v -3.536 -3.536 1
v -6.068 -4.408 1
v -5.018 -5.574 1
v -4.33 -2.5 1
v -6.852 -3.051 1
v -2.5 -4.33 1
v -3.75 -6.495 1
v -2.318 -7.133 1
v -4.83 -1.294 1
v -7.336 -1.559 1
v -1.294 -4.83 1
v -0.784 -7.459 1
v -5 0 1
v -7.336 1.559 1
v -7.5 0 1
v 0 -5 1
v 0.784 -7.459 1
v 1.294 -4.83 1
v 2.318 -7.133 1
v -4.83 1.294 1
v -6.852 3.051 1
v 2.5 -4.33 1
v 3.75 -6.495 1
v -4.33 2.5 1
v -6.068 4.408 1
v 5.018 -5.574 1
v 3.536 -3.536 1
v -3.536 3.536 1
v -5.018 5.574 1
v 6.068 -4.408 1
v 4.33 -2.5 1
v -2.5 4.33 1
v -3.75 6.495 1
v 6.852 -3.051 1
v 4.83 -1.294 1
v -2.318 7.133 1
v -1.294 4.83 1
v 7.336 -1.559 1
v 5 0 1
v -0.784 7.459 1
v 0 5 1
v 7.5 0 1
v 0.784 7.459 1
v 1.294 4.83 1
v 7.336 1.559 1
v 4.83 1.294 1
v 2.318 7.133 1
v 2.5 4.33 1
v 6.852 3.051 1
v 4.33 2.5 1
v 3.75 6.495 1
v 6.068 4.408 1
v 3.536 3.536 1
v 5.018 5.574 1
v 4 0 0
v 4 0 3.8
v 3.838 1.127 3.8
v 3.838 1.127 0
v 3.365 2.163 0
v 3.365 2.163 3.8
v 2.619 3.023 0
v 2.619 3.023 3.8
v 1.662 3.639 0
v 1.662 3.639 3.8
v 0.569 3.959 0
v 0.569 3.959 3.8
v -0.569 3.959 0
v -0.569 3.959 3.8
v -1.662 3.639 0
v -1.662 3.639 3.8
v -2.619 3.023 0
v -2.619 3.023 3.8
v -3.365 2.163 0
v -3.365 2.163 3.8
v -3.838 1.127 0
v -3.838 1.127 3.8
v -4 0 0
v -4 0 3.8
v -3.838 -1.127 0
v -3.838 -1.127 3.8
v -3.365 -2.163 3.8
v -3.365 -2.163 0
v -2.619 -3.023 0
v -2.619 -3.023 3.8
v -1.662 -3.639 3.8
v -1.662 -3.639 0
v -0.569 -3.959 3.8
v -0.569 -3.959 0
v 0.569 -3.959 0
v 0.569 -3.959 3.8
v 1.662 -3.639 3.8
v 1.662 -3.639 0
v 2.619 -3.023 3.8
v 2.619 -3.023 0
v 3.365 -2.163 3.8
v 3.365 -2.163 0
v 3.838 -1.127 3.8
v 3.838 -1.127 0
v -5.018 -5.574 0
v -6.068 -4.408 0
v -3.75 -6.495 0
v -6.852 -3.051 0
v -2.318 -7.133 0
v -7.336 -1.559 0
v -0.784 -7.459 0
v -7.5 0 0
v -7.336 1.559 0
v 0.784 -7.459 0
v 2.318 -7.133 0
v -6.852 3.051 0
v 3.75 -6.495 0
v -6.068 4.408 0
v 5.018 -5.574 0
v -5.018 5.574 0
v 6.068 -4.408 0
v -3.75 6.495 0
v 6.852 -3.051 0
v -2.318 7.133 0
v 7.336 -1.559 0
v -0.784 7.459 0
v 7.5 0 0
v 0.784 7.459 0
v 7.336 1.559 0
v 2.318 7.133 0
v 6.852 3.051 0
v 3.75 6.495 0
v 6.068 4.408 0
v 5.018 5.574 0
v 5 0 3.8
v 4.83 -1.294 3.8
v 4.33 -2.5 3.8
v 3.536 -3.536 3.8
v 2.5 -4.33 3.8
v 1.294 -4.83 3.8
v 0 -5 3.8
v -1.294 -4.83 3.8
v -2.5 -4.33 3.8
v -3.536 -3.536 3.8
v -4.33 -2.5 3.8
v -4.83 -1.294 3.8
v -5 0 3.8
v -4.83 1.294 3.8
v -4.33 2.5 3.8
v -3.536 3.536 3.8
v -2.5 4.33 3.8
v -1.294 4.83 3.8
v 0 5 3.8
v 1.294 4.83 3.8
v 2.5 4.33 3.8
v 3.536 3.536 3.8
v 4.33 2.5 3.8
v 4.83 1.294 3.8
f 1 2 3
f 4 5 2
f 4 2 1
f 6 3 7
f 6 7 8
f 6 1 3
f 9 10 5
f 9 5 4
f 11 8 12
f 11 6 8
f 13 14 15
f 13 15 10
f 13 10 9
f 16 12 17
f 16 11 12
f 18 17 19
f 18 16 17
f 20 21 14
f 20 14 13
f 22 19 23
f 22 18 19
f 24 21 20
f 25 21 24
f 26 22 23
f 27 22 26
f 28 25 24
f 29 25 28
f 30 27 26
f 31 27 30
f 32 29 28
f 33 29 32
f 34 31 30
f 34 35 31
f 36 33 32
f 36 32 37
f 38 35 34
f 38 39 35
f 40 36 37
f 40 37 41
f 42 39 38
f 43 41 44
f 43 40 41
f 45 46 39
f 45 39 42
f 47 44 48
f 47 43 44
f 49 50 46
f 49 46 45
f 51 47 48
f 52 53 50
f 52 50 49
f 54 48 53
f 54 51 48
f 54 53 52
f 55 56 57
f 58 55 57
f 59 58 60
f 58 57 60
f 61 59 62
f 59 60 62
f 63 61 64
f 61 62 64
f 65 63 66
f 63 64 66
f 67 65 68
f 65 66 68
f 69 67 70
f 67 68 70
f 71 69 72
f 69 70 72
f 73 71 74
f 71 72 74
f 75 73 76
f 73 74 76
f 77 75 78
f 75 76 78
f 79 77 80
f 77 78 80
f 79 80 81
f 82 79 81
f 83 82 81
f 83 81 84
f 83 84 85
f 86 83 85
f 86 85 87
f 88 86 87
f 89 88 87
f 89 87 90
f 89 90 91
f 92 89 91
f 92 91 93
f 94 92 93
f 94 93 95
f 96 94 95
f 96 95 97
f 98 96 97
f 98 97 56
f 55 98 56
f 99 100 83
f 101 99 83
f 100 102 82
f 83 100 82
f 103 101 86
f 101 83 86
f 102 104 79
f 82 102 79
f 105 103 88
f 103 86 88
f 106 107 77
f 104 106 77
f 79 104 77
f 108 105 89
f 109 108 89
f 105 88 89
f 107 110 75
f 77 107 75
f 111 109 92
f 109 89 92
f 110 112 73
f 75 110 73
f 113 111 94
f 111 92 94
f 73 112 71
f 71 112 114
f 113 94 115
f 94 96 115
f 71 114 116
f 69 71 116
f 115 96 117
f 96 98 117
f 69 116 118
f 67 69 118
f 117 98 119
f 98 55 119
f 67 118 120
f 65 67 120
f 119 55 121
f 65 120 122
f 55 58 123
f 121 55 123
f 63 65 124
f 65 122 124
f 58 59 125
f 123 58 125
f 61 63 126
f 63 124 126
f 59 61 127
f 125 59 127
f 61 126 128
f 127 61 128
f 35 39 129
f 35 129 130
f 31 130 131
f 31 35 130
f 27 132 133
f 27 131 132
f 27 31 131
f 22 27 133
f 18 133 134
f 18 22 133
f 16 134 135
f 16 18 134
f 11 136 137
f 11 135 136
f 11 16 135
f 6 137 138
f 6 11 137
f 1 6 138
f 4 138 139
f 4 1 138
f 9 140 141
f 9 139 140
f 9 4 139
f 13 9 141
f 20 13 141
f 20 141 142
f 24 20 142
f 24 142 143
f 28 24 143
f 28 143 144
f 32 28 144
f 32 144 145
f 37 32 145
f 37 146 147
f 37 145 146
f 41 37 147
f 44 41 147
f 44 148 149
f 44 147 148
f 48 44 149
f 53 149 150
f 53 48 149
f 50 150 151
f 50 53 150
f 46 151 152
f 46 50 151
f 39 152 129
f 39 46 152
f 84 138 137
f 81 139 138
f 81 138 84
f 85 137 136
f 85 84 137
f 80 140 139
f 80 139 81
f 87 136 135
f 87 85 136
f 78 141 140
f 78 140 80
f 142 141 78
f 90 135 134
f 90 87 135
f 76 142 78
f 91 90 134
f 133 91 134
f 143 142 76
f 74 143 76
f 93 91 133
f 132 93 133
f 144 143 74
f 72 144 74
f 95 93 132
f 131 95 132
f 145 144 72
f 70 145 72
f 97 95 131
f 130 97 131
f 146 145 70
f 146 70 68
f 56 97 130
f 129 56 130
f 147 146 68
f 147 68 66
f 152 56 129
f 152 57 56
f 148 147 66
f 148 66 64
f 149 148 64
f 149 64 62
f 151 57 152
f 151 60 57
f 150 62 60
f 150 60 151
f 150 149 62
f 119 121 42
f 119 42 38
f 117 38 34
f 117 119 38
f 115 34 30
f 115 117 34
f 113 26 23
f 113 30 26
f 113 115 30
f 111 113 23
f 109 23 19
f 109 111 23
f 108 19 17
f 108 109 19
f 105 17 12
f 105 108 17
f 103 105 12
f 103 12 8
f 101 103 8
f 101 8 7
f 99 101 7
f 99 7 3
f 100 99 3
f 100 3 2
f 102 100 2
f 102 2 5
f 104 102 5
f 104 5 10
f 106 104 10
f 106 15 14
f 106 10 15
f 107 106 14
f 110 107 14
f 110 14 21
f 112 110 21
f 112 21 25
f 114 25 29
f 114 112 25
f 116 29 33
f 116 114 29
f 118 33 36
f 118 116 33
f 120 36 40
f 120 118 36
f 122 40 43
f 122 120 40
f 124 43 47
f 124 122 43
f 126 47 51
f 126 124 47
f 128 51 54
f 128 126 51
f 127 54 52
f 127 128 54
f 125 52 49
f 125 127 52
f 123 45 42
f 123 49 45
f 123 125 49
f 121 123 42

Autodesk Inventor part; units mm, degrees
ref_plane "YZ Plane" through (0, 0, 0) normal (1, 0, 0) x (0, 1, 0)
ref_plane "XZ Plane" through (0, 0, 0) normal (0, 1, 0) x (-1, 0, 0)
ref_plane "XY Plane" through (0, 0, 0) normal (0, 0, 1) x (1, 0, 0)
sketch "スケッチ1" plane through (0, 0, 0) normal (0, 0, 1) x (1, 0, 0)
  circle A0 centre (0, 0) radius 7.5
  dimension "d0" = 15
extrude "押し出し1" add sketch "スケッチ1" along normal blind 1
sketch "スケッチ2" plane through (0, 0, 1) normal (0, 0, 1) x (1, 0, 0)
  circle A0 centre (0, 0) radius 5
  dimension "d3" = 10
extrude "押し出し2" add sketch "スケッチ2" along normal blind 2.8
sketch "スケッチ3" plane through (0, 0, 3.8) normal (0, 0, 1) x (1, 0, 0)
  circle A0 centre (0, 0) radius 5 projected
  circle A1 centre (0, 0) radius 5 projected
  circle A2 centre (0, 0) radius 4
  dimension "d6" = 8
extrude "押し出し3" cut sketch "スケッチ3" against normal through all contours A2
properties part number "oiles_bush8" material "ABS プラスチック"
